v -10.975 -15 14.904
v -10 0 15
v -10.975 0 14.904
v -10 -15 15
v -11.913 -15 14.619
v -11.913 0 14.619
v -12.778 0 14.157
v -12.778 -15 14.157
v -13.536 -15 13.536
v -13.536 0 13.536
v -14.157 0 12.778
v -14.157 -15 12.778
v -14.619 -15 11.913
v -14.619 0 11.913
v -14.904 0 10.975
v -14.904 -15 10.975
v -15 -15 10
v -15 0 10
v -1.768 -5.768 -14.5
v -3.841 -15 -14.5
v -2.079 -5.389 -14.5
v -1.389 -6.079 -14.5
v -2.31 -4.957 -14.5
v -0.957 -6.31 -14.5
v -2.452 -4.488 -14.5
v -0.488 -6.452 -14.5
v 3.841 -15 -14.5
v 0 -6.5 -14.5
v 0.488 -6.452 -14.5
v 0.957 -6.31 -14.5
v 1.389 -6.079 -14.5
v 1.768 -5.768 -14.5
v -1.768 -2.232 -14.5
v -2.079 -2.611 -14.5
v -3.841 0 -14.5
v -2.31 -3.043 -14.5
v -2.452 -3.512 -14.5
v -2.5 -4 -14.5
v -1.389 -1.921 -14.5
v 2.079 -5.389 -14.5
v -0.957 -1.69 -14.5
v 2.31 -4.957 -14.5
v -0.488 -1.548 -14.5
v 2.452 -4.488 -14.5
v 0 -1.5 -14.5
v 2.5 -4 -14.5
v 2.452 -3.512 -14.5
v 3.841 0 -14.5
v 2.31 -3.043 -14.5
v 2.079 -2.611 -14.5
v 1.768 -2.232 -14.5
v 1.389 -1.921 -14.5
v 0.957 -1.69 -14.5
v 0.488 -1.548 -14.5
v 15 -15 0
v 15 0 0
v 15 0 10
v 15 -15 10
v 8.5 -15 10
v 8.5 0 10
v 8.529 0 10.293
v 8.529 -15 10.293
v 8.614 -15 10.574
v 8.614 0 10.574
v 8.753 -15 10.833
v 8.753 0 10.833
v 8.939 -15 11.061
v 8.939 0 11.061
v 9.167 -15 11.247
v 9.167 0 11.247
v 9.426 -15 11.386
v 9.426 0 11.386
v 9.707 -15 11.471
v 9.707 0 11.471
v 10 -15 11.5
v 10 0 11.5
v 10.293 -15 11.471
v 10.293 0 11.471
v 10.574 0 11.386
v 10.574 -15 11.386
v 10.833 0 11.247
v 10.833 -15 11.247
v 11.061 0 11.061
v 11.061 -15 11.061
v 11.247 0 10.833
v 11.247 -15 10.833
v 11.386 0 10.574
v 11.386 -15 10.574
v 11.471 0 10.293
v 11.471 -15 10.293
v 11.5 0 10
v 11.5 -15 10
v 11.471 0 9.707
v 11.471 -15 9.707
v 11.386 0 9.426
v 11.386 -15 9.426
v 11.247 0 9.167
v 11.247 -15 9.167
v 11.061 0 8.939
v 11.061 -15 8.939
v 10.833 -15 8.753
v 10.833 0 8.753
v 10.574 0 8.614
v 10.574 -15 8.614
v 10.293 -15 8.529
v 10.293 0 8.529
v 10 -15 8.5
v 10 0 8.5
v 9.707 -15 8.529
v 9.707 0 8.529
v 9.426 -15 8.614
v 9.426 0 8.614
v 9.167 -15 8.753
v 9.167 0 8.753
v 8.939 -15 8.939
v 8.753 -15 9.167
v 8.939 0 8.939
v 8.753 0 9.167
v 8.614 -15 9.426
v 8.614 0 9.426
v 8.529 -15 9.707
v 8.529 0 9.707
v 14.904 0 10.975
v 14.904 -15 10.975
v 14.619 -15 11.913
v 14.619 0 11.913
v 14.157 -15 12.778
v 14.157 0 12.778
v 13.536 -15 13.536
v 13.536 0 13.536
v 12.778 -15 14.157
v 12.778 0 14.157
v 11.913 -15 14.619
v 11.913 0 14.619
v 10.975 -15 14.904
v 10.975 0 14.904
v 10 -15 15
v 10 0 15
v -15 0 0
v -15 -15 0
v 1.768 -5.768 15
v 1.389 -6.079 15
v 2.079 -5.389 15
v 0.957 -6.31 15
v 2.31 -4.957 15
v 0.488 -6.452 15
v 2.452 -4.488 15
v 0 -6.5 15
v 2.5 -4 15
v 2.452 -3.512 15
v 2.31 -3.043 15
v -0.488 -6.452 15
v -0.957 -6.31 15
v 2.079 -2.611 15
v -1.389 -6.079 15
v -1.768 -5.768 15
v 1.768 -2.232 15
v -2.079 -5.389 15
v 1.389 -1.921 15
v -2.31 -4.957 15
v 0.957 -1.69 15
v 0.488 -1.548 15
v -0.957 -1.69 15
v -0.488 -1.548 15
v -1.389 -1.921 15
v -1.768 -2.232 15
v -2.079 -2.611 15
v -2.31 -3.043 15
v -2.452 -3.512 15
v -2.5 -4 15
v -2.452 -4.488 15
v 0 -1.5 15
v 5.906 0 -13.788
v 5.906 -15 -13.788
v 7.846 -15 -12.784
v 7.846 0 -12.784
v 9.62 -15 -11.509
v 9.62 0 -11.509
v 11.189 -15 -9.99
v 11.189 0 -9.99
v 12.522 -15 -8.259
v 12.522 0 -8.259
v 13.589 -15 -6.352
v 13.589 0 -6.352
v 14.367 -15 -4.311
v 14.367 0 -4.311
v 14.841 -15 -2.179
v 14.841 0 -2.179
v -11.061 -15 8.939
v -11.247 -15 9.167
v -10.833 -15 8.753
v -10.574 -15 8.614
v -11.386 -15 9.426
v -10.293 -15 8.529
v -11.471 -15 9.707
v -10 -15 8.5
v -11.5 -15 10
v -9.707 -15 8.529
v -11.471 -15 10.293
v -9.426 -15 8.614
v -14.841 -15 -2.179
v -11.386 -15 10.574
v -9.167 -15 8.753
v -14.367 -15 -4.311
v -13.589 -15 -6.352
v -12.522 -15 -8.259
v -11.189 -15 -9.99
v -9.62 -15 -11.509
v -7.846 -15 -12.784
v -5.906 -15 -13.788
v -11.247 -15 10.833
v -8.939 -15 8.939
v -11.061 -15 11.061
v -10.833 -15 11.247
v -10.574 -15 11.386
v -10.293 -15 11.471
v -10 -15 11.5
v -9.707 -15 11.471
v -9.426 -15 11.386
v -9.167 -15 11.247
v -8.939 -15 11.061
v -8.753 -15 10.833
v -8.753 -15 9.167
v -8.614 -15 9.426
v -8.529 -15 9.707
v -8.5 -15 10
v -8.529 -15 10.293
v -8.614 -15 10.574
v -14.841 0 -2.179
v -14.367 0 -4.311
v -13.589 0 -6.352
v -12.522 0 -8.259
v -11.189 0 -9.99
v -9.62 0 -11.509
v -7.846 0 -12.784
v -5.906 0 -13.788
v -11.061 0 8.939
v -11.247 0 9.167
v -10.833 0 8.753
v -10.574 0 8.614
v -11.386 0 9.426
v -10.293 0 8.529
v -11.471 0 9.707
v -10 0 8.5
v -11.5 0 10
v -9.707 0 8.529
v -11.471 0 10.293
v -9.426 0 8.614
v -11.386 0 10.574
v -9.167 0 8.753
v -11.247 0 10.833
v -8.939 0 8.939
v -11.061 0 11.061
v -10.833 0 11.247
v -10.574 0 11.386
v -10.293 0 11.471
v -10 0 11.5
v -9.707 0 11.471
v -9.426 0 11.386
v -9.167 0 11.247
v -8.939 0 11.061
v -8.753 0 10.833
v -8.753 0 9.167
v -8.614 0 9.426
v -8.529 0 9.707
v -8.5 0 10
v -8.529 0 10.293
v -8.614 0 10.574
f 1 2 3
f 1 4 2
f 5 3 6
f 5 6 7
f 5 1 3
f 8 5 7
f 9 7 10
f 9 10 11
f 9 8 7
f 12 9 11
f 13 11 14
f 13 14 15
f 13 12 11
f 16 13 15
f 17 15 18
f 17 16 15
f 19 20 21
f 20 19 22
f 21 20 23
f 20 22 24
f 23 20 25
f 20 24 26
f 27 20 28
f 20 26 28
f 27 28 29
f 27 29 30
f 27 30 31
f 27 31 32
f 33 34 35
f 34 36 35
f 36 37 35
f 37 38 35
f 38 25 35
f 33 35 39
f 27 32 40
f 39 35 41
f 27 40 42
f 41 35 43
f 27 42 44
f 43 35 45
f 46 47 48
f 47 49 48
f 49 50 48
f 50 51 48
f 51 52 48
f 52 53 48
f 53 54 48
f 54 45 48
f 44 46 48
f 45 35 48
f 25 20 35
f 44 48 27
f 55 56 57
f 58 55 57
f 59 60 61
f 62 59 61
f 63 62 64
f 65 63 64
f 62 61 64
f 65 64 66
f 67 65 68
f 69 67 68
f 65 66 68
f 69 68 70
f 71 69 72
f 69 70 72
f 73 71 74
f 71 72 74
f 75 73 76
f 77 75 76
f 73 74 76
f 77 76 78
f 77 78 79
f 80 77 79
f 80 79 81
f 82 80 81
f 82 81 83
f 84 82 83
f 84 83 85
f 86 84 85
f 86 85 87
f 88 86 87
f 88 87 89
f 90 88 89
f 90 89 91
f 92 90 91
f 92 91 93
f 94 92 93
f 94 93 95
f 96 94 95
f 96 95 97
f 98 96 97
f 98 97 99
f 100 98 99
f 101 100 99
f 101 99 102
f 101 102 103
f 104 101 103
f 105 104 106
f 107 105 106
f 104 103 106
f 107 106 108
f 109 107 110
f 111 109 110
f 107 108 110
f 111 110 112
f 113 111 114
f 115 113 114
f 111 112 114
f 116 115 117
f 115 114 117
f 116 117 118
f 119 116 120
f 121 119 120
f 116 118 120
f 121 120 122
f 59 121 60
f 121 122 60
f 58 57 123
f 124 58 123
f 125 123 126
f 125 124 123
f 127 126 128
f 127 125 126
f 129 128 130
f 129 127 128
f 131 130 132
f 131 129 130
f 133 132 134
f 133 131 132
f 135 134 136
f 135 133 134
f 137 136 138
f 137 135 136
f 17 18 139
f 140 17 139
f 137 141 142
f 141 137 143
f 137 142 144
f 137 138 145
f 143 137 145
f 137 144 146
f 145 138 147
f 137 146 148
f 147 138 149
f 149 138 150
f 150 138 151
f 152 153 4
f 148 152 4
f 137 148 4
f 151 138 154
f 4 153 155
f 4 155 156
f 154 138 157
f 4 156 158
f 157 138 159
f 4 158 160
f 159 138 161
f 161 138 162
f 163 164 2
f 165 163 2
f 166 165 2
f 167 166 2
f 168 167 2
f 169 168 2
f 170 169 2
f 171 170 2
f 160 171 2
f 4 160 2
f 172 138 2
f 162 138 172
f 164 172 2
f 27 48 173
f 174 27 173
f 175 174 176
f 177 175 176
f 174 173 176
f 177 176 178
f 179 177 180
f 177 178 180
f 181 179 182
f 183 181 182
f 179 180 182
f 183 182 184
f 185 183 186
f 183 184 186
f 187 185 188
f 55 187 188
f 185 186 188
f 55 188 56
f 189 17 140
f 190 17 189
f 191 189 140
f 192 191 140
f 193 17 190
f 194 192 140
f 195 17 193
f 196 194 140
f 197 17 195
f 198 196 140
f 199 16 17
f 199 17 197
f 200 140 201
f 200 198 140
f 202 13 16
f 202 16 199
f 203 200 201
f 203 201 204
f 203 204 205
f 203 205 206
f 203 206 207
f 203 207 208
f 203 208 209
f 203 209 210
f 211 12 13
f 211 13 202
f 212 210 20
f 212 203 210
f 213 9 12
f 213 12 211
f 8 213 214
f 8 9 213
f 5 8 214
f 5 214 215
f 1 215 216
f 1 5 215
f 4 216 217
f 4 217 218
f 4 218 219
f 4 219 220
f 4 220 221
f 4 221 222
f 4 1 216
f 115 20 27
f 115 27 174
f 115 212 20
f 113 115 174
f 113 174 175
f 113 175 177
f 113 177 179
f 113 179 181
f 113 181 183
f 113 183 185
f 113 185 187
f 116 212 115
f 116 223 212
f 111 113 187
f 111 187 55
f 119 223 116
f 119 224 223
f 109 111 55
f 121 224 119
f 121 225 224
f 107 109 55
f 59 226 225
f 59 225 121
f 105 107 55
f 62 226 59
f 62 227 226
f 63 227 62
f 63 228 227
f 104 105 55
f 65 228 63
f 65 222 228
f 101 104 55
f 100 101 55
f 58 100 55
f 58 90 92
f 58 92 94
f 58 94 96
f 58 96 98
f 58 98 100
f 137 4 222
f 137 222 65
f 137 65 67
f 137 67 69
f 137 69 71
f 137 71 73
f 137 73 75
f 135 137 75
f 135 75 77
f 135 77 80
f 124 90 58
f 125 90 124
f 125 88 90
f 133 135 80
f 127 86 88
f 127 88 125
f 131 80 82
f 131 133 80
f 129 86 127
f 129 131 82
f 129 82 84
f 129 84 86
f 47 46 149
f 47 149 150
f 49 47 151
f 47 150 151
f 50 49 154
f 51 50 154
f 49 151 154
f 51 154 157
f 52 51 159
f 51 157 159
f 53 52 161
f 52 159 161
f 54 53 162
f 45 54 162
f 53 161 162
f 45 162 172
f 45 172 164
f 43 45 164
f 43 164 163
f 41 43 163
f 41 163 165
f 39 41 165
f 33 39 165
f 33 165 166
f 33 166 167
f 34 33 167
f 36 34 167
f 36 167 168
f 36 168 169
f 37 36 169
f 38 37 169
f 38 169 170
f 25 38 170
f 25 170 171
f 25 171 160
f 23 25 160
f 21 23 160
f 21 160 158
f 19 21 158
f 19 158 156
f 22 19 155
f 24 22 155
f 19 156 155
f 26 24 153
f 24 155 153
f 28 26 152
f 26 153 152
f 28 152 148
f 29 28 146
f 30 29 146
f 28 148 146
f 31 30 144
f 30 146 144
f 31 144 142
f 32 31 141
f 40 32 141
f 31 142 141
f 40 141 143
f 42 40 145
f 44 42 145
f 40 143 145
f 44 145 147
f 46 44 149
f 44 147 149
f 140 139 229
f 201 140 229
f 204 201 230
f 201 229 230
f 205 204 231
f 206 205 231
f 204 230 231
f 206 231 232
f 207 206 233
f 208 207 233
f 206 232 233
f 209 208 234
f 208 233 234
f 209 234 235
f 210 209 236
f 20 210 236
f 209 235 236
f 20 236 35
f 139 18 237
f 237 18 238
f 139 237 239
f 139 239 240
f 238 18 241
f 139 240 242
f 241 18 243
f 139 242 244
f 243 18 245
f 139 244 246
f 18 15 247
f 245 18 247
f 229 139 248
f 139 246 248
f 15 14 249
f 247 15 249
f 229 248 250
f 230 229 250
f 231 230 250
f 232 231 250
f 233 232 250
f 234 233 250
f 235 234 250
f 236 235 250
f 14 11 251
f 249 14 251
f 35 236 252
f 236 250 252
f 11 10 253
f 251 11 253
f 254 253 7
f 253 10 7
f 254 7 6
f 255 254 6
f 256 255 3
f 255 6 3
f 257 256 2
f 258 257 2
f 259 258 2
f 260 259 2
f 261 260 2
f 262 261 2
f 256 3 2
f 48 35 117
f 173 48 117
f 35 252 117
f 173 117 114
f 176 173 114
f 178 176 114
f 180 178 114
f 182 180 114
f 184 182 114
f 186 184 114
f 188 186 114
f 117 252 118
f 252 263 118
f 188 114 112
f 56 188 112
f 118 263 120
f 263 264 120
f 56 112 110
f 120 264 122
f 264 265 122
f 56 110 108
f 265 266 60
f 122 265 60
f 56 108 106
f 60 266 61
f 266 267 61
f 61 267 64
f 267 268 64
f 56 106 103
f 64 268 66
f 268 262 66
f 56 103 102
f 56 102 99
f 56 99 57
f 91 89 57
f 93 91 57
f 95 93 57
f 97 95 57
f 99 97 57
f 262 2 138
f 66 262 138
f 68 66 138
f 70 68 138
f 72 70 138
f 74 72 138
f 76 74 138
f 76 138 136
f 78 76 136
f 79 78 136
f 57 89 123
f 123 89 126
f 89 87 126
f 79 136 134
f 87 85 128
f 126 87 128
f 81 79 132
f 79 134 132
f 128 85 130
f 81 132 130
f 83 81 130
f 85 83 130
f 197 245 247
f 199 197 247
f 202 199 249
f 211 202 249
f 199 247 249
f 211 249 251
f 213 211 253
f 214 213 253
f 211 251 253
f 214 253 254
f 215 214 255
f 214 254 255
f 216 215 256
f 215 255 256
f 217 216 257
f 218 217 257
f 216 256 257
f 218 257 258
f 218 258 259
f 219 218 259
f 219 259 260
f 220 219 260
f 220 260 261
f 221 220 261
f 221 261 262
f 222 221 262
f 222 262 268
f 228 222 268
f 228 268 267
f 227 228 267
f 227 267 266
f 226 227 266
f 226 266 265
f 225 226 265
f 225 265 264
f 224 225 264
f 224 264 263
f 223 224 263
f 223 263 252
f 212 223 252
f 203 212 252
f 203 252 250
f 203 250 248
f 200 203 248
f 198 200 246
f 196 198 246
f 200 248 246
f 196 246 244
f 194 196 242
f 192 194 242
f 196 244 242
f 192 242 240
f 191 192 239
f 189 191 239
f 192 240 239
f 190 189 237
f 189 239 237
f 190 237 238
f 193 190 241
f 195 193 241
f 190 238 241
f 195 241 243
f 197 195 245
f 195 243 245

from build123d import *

# Parameters (mm, degrees)
F1_DEPTH = 15
F2_R     = 1.5
F3_DEPTH = 25
F4_R     = 5
F5_R     = 2.5
F6_DEPTH = 29.501


with BuildPart() as f1:
    # F0 (on Front) → F1 (new body)
    with BuildSketch(Plane.XZ):
        with BuildLine():
            Line((15, 0), (15, 15))
            Line((15, 15), (0, 15))
            ThreePointArc((0, 15), (10.606602, 10.606602), (15, 0))
        make_face()
        with BuildLine():
            ThreePointArc((-15, 0), (-10.606602, 10.606602), (0, 15))
            Line((0, 15), (-15, 15))
            Line((-15, 15), (-15, 0))
        make_face()
        with BuildLine():
            ThreePointArc((15, 0), (10.606602, 10.606602), (0, 15))
            ThreePointArc((0, 15), (-10.606602, 10.606602), (-15, 0))
            ThreePointArc((-15, 0), (-11.887148, -9.148536), (-3.840573, -14.5))
            Line((-3.840573, -14.5), (3.840573, -14.5))
            ThreePointArc((3.840573, -14.5), (11.887148, -9.148536), (15, 0))
        make_face()
    extrude(amount=F1_DEPTH)

    # F2 (on face) → F3 (cut)
    with BuildSketch(Plane(origin=(0, 0, 0), x_dir=(-1, 0, 0), z_dir=(0, 1, 0))):
        with Locations((10, 10)):
            Circle(F2_R)
        with Locations((-10, 10)):
            Circle(F2_R)
    extrude(amount=-F3_DEPTH, mode=Mode.SUBTRACT)

    # F4
    f4_edges = [f1.edges().sort_by_distance(p)[0] for p in [
        (-15, -7.5, 15),
        (15, -7.5, 15),
    ]]
    fillet(f4_edges, radius=F4_R)

    # F5 (on face) → F6 (cut, through all)
    with BuildSketch(Plane.XY.offset(15)):
        with Locations((0, -4)):
            Circle(F5_R)
    extrude(amount=-F6_DEPTH, mode=Mode.SUBTRACT)


solid = f1.part
